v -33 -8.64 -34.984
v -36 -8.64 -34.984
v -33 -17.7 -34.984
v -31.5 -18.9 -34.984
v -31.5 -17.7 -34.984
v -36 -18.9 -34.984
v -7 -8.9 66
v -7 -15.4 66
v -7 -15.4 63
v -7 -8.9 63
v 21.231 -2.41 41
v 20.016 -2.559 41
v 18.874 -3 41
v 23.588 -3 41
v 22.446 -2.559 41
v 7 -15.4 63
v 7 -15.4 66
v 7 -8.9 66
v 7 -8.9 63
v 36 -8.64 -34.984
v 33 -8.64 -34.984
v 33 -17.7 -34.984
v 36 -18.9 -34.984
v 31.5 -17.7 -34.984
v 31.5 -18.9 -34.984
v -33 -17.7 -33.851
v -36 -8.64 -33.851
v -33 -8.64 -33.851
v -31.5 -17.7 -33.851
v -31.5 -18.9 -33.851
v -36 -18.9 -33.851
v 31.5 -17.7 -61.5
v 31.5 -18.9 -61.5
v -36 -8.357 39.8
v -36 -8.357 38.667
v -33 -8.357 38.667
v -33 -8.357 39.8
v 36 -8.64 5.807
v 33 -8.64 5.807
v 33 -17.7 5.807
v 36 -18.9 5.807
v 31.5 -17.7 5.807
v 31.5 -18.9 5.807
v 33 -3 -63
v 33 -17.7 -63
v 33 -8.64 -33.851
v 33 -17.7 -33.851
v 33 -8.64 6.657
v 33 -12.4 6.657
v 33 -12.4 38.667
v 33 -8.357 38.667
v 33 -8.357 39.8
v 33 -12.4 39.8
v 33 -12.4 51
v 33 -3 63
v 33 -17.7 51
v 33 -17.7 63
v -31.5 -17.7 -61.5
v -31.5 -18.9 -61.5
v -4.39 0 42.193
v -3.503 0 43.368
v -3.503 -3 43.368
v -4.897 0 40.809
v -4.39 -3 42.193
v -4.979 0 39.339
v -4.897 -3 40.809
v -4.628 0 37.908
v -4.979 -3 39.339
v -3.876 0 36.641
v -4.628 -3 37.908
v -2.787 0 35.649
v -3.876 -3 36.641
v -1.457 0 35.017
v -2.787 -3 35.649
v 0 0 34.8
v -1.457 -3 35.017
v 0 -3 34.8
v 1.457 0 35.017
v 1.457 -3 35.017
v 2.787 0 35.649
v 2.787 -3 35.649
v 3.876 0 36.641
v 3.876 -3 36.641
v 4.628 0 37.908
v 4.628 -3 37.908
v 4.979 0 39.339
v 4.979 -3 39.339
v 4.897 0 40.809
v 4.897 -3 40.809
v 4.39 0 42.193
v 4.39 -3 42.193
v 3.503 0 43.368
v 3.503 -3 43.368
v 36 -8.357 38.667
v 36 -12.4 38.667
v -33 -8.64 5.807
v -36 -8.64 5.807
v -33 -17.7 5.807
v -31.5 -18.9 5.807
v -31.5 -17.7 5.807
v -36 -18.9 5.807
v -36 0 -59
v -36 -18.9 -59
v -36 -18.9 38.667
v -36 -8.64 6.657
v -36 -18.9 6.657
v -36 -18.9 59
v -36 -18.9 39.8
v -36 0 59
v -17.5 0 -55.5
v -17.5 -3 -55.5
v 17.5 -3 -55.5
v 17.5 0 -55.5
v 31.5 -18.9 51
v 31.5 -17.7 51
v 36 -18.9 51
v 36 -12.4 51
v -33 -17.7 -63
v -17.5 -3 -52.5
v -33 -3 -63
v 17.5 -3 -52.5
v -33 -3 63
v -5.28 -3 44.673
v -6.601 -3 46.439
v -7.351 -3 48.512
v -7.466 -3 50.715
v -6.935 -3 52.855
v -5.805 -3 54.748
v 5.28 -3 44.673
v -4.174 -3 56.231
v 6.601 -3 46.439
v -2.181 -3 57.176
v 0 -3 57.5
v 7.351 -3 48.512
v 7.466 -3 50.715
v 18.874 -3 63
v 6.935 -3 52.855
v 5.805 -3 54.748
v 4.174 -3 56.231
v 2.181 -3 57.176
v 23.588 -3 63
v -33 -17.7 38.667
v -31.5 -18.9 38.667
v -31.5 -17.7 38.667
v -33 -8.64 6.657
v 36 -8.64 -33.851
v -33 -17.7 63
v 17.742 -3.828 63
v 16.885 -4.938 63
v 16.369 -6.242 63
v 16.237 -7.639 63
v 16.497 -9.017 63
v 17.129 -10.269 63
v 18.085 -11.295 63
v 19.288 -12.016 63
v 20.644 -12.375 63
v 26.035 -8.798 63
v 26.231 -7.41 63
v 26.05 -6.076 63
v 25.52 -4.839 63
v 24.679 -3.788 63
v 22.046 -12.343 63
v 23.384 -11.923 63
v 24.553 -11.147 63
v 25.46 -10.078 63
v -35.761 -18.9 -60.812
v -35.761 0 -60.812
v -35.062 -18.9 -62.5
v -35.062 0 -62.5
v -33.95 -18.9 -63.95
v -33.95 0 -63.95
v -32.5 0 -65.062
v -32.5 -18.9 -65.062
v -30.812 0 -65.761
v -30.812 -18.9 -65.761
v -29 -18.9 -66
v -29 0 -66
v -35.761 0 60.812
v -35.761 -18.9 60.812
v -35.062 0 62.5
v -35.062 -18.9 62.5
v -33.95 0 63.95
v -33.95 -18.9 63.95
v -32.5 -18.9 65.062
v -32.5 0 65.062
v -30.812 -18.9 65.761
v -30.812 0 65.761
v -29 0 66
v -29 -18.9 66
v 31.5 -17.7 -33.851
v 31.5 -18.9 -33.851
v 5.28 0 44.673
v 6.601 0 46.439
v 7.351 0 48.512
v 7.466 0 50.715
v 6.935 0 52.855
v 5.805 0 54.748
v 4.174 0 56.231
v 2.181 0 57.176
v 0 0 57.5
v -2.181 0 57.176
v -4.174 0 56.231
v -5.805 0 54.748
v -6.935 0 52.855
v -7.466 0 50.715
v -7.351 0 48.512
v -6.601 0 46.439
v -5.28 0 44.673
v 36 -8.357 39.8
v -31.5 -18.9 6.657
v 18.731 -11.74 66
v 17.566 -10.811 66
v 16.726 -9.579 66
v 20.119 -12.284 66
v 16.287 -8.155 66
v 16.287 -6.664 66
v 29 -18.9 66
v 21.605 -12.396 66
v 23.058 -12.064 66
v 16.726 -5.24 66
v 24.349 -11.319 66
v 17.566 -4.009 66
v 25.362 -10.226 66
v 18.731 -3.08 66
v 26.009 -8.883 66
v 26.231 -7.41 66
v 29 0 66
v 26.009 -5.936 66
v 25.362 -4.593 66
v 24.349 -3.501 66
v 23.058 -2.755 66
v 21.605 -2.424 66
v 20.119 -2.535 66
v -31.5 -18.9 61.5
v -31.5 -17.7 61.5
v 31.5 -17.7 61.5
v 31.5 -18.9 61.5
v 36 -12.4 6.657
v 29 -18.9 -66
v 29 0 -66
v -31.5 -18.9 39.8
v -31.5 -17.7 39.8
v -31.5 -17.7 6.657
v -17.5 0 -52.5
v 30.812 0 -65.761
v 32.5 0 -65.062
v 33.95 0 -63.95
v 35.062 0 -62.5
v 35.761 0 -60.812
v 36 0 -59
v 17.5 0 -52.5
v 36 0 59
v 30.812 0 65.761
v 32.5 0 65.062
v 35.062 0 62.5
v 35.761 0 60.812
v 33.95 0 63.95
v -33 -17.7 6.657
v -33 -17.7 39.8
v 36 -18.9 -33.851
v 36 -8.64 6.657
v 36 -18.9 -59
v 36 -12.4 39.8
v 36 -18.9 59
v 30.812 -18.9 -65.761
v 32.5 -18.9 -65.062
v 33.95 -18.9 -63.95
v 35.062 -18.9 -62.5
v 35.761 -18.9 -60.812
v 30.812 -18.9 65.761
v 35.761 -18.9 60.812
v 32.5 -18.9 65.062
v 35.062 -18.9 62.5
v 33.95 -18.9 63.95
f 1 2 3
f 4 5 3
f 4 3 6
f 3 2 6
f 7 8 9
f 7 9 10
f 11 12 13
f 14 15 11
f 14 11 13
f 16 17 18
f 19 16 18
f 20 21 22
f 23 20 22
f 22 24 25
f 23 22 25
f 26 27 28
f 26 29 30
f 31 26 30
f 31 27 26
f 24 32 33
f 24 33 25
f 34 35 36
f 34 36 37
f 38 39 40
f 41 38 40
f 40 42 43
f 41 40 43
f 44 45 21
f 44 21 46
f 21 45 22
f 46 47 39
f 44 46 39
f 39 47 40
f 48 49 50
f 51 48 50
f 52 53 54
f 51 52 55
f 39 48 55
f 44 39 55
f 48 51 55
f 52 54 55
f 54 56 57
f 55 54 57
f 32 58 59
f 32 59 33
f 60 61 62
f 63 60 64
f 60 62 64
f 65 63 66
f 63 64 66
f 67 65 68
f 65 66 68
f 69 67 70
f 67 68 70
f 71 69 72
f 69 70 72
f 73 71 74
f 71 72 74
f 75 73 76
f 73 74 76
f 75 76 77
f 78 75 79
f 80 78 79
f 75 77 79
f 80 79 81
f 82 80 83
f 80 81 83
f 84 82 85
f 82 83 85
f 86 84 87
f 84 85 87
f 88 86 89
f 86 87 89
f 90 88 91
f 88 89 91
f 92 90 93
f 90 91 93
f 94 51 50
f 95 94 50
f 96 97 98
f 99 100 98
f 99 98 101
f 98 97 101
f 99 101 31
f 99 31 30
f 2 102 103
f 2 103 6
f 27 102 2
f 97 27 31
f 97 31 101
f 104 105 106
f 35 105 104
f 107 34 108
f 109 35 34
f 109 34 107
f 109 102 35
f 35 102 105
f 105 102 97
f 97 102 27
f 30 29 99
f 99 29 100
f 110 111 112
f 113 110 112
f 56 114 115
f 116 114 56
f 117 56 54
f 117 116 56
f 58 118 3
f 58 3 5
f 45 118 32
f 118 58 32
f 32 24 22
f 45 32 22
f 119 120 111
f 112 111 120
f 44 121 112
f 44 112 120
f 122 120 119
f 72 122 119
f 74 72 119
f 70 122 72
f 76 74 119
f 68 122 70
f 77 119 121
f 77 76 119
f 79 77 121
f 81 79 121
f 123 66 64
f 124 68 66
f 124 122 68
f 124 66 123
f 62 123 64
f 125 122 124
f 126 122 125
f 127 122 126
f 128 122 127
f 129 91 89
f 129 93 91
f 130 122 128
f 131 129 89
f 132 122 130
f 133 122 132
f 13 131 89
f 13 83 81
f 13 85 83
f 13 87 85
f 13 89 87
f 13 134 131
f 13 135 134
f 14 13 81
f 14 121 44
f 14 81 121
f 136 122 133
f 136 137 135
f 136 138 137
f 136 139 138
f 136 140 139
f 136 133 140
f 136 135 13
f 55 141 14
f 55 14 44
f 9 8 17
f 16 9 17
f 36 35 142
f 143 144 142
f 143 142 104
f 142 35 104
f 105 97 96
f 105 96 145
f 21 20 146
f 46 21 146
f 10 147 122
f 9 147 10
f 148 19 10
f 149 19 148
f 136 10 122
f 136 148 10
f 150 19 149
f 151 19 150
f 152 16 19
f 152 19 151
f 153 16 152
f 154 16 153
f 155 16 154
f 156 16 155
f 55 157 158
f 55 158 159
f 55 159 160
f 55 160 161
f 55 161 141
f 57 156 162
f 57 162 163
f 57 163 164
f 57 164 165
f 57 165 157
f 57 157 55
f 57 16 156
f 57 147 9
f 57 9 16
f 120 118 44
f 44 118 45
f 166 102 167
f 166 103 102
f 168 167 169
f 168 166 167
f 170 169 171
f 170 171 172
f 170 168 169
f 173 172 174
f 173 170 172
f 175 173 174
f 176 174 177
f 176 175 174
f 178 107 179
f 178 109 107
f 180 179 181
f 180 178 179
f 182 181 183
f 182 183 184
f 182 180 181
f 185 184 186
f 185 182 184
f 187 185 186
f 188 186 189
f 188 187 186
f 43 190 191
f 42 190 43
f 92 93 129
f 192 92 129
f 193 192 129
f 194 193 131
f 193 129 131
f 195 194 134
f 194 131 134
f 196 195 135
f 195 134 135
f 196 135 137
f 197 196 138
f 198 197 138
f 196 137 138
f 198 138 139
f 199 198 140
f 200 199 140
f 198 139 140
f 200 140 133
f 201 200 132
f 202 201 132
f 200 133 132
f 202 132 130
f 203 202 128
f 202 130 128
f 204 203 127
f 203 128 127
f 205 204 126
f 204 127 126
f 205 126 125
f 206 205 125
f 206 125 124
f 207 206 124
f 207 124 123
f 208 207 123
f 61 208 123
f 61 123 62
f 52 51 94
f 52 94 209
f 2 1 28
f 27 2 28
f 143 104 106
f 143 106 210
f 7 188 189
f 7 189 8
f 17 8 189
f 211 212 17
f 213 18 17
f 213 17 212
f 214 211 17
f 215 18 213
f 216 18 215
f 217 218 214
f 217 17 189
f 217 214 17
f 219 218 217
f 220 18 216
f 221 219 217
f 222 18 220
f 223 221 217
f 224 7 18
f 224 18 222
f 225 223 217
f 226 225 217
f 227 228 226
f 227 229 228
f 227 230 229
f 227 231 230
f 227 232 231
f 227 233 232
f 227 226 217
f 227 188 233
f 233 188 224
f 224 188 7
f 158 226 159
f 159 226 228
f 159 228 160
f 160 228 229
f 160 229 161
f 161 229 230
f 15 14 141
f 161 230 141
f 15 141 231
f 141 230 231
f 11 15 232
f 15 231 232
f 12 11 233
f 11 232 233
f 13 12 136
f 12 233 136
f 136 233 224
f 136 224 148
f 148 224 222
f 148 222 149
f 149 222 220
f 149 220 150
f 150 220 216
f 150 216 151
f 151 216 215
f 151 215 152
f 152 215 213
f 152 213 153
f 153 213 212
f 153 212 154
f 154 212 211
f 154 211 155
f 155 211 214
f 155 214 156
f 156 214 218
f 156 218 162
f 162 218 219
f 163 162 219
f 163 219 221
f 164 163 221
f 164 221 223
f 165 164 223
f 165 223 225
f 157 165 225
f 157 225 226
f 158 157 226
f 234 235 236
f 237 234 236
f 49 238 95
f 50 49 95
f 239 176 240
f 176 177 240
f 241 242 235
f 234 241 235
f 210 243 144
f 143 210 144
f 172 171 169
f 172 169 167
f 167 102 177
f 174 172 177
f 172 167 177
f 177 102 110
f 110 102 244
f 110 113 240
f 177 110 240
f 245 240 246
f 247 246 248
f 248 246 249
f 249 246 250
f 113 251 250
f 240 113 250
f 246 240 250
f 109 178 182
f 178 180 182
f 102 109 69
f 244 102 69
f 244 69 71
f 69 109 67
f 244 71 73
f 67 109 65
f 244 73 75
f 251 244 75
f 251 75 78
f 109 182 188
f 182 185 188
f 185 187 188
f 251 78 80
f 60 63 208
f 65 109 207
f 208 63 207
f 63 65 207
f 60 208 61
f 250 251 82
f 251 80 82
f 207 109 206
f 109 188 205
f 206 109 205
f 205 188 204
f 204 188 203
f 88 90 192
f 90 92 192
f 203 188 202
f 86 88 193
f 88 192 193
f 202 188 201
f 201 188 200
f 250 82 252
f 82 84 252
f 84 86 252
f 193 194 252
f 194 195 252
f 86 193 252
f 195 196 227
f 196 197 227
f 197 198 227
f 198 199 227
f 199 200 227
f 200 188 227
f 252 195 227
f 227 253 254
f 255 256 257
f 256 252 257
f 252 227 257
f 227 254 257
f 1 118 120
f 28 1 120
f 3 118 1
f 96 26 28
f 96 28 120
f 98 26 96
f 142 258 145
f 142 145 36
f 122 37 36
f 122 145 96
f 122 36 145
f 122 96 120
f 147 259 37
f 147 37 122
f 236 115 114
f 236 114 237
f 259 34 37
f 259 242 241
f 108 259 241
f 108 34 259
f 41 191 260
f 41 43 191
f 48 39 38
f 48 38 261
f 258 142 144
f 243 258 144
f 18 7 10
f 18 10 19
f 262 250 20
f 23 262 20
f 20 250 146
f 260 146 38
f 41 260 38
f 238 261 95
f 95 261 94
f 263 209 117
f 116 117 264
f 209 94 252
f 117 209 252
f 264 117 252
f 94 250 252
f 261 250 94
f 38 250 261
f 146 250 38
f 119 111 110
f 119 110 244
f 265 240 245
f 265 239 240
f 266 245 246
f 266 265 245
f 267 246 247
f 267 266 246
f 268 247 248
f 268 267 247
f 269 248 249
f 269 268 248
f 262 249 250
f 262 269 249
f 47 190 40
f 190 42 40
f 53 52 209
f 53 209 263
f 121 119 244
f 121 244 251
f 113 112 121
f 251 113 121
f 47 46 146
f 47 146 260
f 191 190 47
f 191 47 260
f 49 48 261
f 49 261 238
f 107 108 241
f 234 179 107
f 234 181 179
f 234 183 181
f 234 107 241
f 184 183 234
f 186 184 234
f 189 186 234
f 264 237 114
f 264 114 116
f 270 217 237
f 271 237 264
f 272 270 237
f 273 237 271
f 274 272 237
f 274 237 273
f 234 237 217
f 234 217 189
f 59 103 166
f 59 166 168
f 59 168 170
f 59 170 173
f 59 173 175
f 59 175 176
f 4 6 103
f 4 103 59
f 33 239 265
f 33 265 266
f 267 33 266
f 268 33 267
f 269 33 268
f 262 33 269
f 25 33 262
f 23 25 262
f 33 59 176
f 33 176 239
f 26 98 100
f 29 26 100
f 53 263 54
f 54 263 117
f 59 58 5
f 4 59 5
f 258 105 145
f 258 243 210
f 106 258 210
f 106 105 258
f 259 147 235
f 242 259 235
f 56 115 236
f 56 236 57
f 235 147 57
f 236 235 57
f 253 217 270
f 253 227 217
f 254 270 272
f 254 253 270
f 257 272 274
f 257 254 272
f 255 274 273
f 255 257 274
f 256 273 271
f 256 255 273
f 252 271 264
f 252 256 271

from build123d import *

# Parameters (mm, degrees)
F0_W      = 72
F0_H      = 132
F1_DEPTH  = 17.7
F2_W      = 66
F2_H      = 126
F3_DEPTH  = 14.7
F4_W      = 72
F4_H      = 132
F4_W_2    = 66
F4_H_2    = 126
F4_W_3    = 63
F4_H_3    = 123
F5_DEPTH  = 1.2
F6_R      = 7.5
F7_DEPTH  = 25
F8_DEPTH  = 25
F9_R      = 5
F10_DEPTH = 25
F11_W     = 14
F11_H     = 6.5
F12_DEPTH = 25
F13_W     = 35
F13_H     = 3
F14_DEPTH = 25
F15_W     = 6.5
F15_H     = 45
F16_DEPTH = 25
F17_R     = 5
F18_DEPTH = 25
F19_R     = 7
F20_W     = 10.5434343904
F20_H     = 1.1330954731
F20_W_2   = 10.2601605222
F20_H_2   = 0.8498206735
F20_H_3   = 1.1330917478
F21_DEPTH = 81


with BuildPart() as f1:
    # F0 (on Front) → F1 (new body)
    with BuildSketch(Plane.XZ):
        Rectangle(F0_W, F0_H)
    extrude(amount=F1_DEPTH)

    # F2 (on face) → F3 (cut, through all)
    with BuildSketch(Plane.XZ.offset(17.7)):
        Rectangle(F2_W, F2_H)
    extrude(amount=-F3_DEPTH, mode=Mode.SUBTRACT)

    # F4 (on face) → F5 (join)
    with BuildSketch(Plane.XZ.offset(17.7)):
        Rectangle(F4_W, F4_H)
        Rectangle(F4_W_2, F4_H_2, mode=Mode.SUBTRACT)
        Rectangle(F4_W_2, F4_H_2)
        Rectangle(F4_W_3, F4_H_3, mode=Mode.SUBTRACT)
    extrude(amount=F5_DEPTH)

    # F6 (on face) → F7 (cut)
    with BuildSketch(Plane.XZ.offset(3)):
        with Locations((0, 50)):
            Circle(F6_R)
    extrude(amount=-F7_DEPTH, mode=Mode.SUBTRACT)

    # F6 (on face) → F8 (cut)
    with BuildSketch(Plane.XZ.offset(3)):
        with Locations((0, 50)):
            Circle(F6_R)
    extrude(amount=-F8_DEPTH, mode=Mode.SUBTRACT)

    # F9 (on face) → F10 (cut)
    with BuildSketch(Plane.XZ.offset(3)):
        with Locations((0, 39.799913764)):
            Circle(F9_R)
    extrude(amount=-F10_DEPTH, mode=Mode.SUBTRACT)

    # F11 (on face) → F12 (cut)
    with BuildSketch(Plane.XY.offset(66)):
        with Locations((0, -12.15)):
            Rectangle(F11_W, F11_H)
    extrude(amount=-F12_DEPTH, mode=Mode.SUBTRACT)

    # F13 (on face) → F14 (cut)
    with BuildSketch(Plane.XZ.offset(3)):
        with Locations((0, -54)):
            Rectangle(F13_W, F13_H)
    extrude(amount=-F14_DEPTH, mode=Mode.SUBTRACT)

    # F15 (on face) → F16 (cut)
    with BuildSketch(Plane.YZ.offset(36)):
        with Locations((-15.65, 28.5)):
            Rectangle(F15_W, F15_H)
    extrude(amount=-F16_DEPTH, mode=Mode.SUBTRACT)

    # F17 (on face) → F18 (cut)
    with BuildSketch(Plane.XY.offset(66)):
        with Locations((21.231278264, -7.4096710059)):
            Circle(F17_R)
    extrude(amount=-F18_DEPTH, mode=Mode.SUBTRACT)

    # F19
    f19_edges = [f1.edges().sort_by_distance(p)[0] for p in [
        (-36, -9.45, 66),
        (36, -9.45, 66),
        (-36, -9.45, -66),
        (36, -9.45, -66),
    ]]
    fillet(f19_edges, radius=F19_R)

    # F20 (on face) → F21 (cut)
    with BuildSketch(Plane(origin=(-36, 0, 0), x_dir=(0, -1, 0), z_dir=(-1, 0, 0))):
        with Locations((13.6282828048, 39.2333660275)):
            Rectangle(F20_W, F20_H)
        with Locations((13.7699197389, 6.2320143916)):
            Rectangle(F20_W_2, F20_H_2)
        with Locations((13.7699197389, -34.4177186489)):
            Rectangle(F20_W_2, F20_H_3)
    extrude(amount=-F21_DEPTH, mode=Mode.SUBTRACT)


solid = f1.part
